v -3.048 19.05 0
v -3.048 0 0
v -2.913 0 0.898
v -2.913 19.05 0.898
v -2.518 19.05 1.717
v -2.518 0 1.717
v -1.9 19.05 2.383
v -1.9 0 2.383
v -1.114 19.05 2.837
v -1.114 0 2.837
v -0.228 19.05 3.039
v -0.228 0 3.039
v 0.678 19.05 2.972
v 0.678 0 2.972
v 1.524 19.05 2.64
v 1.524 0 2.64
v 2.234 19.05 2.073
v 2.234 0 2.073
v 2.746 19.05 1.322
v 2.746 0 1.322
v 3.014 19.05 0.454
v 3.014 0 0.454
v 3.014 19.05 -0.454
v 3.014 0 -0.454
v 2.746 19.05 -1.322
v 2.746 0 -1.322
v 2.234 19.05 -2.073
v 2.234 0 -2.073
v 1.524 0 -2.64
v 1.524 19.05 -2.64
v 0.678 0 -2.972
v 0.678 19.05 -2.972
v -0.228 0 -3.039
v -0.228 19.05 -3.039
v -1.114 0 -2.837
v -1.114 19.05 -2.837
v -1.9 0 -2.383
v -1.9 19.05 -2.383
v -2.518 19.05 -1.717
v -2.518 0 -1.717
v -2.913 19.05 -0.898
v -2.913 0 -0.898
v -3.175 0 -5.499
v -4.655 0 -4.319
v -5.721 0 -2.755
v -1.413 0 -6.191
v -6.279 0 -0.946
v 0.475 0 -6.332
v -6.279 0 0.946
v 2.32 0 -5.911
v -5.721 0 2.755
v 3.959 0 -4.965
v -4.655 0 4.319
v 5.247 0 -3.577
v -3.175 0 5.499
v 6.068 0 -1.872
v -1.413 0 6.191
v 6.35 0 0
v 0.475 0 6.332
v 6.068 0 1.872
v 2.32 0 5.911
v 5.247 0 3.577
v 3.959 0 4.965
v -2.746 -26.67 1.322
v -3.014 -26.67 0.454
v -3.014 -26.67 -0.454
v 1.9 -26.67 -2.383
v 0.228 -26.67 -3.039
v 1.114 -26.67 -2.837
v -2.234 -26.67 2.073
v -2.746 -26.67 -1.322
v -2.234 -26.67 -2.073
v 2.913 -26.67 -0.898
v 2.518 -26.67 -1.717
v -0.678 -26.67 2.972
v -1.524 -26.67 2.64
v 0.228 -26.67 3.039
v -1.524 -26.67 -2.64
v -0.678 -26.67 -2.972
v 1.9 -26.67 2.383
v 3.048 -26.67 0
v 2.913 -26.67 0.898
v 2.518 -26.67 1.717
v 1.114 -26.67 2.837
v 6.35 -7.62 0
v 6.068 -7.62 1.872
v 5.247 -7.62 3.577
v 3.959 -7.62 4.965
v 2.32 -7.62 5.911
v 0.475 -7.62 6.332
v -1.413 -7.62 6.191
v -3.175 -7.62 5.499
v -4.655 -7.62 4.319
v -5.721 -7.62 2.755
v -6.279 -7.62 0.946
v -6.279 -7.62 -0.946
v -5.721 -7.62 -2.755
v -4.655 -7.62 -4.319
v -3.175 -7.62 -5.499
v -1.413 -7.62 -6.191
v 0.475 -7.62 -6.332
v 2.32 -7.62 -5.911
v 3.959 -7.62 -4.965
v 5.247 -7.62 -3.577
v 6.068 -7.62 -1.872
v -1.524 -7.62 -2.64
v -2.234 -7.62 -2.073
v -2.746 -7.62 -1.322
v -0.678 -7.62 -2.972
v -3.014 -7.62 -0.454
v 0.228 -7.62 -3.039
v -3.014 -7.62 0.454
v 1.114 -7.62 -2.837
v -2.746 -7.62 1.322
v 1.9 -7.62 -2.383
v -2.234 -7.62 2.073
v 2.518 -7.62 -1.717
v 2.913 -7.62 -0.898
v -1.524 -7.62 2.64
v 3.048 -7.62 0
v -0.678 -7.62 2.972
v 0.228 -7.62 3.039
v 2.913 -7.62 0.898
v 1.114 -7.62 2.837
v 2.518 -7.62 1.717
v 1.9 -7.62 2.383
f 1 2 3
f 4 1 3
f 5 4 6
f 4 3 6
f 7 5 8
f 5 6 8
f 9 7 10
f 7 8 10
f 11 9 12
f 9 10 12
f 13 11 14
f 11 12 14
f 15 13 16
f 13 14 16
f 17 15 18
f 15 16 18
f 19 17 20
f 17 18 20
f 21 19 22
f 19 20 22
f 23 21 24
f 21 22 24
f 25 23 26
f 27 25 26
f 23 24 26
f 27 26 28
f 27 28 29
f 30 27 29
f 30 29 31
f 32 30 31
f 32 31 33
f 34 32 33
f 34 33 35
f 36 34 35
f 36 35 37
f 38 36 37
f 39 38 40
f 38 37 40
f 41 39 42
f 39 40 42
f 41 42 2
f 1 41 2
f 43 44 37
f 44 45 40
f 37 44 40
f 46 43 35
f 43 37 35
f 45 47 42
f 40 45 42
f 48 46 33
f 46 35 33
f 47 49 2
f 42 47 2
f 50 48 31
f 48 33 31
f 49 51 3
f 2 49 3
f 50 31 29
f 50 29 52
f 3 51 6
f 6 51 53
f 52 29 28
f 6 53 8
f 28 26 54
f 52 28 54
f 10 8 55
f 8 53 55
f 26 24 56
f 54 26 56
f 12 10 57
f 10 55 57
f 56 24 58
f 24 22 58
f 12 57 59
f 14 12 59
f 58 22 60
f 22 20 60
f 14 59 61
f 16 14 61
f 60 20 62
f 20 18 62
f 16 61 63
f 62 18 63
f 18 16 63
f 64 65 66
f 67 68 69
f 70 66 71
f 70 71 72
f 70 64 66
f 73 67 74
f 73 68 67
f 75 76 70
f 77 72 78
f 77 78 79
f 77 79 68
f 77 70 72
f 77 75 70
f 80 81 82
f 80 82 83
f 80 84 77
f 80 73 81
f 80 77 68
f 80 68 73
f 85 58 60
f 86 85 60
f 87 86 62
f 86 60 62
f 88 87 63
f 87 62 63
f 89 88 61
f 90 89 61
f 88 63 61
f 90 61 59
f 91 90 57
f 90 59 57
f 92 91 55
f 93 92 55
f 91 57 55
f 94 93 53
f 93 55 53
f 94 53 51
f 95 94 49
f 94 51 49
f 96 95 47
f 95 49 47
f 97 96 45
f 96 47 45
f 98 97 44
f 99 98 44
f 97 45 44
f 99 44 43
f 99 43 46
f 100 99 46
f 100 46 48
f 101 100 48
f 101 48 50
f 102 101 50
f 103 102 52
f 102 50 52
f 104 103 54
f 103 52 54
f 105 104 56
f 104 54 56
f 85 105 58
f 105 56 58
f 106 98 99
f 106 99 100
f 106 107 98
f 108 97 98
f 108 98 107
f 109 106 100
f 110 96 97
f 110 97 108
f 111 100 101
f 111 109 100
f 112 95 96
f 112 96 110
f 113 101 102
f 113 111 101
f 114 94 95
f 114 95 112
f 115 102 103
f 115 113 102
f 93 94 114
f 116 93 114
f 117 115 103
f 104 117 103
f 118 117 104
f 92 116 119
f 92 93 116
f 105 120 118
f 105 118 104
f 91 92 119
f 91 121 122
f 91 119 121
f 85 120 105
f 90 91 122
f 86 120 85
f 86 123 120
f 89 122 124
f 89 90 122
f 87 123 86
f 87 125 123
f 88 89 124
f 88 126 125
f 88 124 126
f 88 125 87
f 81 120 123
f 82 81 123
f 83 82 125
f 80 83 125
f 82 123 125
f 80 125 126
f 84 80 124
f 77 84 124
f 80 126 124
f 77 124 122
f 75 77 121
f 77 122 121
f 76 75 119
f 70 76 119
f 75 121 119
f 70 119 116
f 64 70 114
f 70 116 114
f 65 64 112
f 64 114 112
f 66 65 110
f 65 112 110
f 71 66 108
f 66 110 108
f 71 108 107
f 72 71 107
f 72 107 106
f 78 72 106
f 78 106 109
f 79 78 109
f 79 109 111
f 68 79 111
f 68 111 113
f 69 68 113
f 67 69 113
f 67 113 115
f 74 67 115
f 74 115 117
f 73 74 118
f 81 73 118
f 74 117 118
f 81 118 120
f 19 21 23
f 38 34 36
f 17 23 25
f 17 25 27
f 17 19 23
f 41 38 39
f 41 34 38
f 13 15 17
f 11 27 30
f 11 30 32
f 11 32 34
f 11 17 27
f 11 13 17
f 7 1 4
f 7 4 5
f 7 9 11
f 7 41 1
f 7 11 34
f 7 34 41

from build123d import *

# Parameters (mm, degrees)
F0_R     = 6.35
F1_DEPTH = 7.62
F2_R     = 3.048
F3_DEPTH = 19.05
F4_R     = 3.048
F5_DEPTH = 19.05


with BuildPart() as f1:
    # F0 (on Front) → F1 (new body)
    with BuildSketch(Plane.XZ):
        Circle(F0_R)
    extrude(amount=F1_DEPTH)

    # F2 (on face) → F3 (join)
    with BuildSketch(Plane(origin=(0, 0, 0), x_dir=(-1, 0, 0), z_dir=(0, 1, 0))):
        Circle(F2_R)
    extrude(amount=F3_DEPTH)

    # F4 (on face) → F5 (join)
    with BuildSketch(Plane.XZ.offset(7.62)):
        Circle(F4_R)
    extrude(amount=F5_DEPTH)


solid = f1.part
